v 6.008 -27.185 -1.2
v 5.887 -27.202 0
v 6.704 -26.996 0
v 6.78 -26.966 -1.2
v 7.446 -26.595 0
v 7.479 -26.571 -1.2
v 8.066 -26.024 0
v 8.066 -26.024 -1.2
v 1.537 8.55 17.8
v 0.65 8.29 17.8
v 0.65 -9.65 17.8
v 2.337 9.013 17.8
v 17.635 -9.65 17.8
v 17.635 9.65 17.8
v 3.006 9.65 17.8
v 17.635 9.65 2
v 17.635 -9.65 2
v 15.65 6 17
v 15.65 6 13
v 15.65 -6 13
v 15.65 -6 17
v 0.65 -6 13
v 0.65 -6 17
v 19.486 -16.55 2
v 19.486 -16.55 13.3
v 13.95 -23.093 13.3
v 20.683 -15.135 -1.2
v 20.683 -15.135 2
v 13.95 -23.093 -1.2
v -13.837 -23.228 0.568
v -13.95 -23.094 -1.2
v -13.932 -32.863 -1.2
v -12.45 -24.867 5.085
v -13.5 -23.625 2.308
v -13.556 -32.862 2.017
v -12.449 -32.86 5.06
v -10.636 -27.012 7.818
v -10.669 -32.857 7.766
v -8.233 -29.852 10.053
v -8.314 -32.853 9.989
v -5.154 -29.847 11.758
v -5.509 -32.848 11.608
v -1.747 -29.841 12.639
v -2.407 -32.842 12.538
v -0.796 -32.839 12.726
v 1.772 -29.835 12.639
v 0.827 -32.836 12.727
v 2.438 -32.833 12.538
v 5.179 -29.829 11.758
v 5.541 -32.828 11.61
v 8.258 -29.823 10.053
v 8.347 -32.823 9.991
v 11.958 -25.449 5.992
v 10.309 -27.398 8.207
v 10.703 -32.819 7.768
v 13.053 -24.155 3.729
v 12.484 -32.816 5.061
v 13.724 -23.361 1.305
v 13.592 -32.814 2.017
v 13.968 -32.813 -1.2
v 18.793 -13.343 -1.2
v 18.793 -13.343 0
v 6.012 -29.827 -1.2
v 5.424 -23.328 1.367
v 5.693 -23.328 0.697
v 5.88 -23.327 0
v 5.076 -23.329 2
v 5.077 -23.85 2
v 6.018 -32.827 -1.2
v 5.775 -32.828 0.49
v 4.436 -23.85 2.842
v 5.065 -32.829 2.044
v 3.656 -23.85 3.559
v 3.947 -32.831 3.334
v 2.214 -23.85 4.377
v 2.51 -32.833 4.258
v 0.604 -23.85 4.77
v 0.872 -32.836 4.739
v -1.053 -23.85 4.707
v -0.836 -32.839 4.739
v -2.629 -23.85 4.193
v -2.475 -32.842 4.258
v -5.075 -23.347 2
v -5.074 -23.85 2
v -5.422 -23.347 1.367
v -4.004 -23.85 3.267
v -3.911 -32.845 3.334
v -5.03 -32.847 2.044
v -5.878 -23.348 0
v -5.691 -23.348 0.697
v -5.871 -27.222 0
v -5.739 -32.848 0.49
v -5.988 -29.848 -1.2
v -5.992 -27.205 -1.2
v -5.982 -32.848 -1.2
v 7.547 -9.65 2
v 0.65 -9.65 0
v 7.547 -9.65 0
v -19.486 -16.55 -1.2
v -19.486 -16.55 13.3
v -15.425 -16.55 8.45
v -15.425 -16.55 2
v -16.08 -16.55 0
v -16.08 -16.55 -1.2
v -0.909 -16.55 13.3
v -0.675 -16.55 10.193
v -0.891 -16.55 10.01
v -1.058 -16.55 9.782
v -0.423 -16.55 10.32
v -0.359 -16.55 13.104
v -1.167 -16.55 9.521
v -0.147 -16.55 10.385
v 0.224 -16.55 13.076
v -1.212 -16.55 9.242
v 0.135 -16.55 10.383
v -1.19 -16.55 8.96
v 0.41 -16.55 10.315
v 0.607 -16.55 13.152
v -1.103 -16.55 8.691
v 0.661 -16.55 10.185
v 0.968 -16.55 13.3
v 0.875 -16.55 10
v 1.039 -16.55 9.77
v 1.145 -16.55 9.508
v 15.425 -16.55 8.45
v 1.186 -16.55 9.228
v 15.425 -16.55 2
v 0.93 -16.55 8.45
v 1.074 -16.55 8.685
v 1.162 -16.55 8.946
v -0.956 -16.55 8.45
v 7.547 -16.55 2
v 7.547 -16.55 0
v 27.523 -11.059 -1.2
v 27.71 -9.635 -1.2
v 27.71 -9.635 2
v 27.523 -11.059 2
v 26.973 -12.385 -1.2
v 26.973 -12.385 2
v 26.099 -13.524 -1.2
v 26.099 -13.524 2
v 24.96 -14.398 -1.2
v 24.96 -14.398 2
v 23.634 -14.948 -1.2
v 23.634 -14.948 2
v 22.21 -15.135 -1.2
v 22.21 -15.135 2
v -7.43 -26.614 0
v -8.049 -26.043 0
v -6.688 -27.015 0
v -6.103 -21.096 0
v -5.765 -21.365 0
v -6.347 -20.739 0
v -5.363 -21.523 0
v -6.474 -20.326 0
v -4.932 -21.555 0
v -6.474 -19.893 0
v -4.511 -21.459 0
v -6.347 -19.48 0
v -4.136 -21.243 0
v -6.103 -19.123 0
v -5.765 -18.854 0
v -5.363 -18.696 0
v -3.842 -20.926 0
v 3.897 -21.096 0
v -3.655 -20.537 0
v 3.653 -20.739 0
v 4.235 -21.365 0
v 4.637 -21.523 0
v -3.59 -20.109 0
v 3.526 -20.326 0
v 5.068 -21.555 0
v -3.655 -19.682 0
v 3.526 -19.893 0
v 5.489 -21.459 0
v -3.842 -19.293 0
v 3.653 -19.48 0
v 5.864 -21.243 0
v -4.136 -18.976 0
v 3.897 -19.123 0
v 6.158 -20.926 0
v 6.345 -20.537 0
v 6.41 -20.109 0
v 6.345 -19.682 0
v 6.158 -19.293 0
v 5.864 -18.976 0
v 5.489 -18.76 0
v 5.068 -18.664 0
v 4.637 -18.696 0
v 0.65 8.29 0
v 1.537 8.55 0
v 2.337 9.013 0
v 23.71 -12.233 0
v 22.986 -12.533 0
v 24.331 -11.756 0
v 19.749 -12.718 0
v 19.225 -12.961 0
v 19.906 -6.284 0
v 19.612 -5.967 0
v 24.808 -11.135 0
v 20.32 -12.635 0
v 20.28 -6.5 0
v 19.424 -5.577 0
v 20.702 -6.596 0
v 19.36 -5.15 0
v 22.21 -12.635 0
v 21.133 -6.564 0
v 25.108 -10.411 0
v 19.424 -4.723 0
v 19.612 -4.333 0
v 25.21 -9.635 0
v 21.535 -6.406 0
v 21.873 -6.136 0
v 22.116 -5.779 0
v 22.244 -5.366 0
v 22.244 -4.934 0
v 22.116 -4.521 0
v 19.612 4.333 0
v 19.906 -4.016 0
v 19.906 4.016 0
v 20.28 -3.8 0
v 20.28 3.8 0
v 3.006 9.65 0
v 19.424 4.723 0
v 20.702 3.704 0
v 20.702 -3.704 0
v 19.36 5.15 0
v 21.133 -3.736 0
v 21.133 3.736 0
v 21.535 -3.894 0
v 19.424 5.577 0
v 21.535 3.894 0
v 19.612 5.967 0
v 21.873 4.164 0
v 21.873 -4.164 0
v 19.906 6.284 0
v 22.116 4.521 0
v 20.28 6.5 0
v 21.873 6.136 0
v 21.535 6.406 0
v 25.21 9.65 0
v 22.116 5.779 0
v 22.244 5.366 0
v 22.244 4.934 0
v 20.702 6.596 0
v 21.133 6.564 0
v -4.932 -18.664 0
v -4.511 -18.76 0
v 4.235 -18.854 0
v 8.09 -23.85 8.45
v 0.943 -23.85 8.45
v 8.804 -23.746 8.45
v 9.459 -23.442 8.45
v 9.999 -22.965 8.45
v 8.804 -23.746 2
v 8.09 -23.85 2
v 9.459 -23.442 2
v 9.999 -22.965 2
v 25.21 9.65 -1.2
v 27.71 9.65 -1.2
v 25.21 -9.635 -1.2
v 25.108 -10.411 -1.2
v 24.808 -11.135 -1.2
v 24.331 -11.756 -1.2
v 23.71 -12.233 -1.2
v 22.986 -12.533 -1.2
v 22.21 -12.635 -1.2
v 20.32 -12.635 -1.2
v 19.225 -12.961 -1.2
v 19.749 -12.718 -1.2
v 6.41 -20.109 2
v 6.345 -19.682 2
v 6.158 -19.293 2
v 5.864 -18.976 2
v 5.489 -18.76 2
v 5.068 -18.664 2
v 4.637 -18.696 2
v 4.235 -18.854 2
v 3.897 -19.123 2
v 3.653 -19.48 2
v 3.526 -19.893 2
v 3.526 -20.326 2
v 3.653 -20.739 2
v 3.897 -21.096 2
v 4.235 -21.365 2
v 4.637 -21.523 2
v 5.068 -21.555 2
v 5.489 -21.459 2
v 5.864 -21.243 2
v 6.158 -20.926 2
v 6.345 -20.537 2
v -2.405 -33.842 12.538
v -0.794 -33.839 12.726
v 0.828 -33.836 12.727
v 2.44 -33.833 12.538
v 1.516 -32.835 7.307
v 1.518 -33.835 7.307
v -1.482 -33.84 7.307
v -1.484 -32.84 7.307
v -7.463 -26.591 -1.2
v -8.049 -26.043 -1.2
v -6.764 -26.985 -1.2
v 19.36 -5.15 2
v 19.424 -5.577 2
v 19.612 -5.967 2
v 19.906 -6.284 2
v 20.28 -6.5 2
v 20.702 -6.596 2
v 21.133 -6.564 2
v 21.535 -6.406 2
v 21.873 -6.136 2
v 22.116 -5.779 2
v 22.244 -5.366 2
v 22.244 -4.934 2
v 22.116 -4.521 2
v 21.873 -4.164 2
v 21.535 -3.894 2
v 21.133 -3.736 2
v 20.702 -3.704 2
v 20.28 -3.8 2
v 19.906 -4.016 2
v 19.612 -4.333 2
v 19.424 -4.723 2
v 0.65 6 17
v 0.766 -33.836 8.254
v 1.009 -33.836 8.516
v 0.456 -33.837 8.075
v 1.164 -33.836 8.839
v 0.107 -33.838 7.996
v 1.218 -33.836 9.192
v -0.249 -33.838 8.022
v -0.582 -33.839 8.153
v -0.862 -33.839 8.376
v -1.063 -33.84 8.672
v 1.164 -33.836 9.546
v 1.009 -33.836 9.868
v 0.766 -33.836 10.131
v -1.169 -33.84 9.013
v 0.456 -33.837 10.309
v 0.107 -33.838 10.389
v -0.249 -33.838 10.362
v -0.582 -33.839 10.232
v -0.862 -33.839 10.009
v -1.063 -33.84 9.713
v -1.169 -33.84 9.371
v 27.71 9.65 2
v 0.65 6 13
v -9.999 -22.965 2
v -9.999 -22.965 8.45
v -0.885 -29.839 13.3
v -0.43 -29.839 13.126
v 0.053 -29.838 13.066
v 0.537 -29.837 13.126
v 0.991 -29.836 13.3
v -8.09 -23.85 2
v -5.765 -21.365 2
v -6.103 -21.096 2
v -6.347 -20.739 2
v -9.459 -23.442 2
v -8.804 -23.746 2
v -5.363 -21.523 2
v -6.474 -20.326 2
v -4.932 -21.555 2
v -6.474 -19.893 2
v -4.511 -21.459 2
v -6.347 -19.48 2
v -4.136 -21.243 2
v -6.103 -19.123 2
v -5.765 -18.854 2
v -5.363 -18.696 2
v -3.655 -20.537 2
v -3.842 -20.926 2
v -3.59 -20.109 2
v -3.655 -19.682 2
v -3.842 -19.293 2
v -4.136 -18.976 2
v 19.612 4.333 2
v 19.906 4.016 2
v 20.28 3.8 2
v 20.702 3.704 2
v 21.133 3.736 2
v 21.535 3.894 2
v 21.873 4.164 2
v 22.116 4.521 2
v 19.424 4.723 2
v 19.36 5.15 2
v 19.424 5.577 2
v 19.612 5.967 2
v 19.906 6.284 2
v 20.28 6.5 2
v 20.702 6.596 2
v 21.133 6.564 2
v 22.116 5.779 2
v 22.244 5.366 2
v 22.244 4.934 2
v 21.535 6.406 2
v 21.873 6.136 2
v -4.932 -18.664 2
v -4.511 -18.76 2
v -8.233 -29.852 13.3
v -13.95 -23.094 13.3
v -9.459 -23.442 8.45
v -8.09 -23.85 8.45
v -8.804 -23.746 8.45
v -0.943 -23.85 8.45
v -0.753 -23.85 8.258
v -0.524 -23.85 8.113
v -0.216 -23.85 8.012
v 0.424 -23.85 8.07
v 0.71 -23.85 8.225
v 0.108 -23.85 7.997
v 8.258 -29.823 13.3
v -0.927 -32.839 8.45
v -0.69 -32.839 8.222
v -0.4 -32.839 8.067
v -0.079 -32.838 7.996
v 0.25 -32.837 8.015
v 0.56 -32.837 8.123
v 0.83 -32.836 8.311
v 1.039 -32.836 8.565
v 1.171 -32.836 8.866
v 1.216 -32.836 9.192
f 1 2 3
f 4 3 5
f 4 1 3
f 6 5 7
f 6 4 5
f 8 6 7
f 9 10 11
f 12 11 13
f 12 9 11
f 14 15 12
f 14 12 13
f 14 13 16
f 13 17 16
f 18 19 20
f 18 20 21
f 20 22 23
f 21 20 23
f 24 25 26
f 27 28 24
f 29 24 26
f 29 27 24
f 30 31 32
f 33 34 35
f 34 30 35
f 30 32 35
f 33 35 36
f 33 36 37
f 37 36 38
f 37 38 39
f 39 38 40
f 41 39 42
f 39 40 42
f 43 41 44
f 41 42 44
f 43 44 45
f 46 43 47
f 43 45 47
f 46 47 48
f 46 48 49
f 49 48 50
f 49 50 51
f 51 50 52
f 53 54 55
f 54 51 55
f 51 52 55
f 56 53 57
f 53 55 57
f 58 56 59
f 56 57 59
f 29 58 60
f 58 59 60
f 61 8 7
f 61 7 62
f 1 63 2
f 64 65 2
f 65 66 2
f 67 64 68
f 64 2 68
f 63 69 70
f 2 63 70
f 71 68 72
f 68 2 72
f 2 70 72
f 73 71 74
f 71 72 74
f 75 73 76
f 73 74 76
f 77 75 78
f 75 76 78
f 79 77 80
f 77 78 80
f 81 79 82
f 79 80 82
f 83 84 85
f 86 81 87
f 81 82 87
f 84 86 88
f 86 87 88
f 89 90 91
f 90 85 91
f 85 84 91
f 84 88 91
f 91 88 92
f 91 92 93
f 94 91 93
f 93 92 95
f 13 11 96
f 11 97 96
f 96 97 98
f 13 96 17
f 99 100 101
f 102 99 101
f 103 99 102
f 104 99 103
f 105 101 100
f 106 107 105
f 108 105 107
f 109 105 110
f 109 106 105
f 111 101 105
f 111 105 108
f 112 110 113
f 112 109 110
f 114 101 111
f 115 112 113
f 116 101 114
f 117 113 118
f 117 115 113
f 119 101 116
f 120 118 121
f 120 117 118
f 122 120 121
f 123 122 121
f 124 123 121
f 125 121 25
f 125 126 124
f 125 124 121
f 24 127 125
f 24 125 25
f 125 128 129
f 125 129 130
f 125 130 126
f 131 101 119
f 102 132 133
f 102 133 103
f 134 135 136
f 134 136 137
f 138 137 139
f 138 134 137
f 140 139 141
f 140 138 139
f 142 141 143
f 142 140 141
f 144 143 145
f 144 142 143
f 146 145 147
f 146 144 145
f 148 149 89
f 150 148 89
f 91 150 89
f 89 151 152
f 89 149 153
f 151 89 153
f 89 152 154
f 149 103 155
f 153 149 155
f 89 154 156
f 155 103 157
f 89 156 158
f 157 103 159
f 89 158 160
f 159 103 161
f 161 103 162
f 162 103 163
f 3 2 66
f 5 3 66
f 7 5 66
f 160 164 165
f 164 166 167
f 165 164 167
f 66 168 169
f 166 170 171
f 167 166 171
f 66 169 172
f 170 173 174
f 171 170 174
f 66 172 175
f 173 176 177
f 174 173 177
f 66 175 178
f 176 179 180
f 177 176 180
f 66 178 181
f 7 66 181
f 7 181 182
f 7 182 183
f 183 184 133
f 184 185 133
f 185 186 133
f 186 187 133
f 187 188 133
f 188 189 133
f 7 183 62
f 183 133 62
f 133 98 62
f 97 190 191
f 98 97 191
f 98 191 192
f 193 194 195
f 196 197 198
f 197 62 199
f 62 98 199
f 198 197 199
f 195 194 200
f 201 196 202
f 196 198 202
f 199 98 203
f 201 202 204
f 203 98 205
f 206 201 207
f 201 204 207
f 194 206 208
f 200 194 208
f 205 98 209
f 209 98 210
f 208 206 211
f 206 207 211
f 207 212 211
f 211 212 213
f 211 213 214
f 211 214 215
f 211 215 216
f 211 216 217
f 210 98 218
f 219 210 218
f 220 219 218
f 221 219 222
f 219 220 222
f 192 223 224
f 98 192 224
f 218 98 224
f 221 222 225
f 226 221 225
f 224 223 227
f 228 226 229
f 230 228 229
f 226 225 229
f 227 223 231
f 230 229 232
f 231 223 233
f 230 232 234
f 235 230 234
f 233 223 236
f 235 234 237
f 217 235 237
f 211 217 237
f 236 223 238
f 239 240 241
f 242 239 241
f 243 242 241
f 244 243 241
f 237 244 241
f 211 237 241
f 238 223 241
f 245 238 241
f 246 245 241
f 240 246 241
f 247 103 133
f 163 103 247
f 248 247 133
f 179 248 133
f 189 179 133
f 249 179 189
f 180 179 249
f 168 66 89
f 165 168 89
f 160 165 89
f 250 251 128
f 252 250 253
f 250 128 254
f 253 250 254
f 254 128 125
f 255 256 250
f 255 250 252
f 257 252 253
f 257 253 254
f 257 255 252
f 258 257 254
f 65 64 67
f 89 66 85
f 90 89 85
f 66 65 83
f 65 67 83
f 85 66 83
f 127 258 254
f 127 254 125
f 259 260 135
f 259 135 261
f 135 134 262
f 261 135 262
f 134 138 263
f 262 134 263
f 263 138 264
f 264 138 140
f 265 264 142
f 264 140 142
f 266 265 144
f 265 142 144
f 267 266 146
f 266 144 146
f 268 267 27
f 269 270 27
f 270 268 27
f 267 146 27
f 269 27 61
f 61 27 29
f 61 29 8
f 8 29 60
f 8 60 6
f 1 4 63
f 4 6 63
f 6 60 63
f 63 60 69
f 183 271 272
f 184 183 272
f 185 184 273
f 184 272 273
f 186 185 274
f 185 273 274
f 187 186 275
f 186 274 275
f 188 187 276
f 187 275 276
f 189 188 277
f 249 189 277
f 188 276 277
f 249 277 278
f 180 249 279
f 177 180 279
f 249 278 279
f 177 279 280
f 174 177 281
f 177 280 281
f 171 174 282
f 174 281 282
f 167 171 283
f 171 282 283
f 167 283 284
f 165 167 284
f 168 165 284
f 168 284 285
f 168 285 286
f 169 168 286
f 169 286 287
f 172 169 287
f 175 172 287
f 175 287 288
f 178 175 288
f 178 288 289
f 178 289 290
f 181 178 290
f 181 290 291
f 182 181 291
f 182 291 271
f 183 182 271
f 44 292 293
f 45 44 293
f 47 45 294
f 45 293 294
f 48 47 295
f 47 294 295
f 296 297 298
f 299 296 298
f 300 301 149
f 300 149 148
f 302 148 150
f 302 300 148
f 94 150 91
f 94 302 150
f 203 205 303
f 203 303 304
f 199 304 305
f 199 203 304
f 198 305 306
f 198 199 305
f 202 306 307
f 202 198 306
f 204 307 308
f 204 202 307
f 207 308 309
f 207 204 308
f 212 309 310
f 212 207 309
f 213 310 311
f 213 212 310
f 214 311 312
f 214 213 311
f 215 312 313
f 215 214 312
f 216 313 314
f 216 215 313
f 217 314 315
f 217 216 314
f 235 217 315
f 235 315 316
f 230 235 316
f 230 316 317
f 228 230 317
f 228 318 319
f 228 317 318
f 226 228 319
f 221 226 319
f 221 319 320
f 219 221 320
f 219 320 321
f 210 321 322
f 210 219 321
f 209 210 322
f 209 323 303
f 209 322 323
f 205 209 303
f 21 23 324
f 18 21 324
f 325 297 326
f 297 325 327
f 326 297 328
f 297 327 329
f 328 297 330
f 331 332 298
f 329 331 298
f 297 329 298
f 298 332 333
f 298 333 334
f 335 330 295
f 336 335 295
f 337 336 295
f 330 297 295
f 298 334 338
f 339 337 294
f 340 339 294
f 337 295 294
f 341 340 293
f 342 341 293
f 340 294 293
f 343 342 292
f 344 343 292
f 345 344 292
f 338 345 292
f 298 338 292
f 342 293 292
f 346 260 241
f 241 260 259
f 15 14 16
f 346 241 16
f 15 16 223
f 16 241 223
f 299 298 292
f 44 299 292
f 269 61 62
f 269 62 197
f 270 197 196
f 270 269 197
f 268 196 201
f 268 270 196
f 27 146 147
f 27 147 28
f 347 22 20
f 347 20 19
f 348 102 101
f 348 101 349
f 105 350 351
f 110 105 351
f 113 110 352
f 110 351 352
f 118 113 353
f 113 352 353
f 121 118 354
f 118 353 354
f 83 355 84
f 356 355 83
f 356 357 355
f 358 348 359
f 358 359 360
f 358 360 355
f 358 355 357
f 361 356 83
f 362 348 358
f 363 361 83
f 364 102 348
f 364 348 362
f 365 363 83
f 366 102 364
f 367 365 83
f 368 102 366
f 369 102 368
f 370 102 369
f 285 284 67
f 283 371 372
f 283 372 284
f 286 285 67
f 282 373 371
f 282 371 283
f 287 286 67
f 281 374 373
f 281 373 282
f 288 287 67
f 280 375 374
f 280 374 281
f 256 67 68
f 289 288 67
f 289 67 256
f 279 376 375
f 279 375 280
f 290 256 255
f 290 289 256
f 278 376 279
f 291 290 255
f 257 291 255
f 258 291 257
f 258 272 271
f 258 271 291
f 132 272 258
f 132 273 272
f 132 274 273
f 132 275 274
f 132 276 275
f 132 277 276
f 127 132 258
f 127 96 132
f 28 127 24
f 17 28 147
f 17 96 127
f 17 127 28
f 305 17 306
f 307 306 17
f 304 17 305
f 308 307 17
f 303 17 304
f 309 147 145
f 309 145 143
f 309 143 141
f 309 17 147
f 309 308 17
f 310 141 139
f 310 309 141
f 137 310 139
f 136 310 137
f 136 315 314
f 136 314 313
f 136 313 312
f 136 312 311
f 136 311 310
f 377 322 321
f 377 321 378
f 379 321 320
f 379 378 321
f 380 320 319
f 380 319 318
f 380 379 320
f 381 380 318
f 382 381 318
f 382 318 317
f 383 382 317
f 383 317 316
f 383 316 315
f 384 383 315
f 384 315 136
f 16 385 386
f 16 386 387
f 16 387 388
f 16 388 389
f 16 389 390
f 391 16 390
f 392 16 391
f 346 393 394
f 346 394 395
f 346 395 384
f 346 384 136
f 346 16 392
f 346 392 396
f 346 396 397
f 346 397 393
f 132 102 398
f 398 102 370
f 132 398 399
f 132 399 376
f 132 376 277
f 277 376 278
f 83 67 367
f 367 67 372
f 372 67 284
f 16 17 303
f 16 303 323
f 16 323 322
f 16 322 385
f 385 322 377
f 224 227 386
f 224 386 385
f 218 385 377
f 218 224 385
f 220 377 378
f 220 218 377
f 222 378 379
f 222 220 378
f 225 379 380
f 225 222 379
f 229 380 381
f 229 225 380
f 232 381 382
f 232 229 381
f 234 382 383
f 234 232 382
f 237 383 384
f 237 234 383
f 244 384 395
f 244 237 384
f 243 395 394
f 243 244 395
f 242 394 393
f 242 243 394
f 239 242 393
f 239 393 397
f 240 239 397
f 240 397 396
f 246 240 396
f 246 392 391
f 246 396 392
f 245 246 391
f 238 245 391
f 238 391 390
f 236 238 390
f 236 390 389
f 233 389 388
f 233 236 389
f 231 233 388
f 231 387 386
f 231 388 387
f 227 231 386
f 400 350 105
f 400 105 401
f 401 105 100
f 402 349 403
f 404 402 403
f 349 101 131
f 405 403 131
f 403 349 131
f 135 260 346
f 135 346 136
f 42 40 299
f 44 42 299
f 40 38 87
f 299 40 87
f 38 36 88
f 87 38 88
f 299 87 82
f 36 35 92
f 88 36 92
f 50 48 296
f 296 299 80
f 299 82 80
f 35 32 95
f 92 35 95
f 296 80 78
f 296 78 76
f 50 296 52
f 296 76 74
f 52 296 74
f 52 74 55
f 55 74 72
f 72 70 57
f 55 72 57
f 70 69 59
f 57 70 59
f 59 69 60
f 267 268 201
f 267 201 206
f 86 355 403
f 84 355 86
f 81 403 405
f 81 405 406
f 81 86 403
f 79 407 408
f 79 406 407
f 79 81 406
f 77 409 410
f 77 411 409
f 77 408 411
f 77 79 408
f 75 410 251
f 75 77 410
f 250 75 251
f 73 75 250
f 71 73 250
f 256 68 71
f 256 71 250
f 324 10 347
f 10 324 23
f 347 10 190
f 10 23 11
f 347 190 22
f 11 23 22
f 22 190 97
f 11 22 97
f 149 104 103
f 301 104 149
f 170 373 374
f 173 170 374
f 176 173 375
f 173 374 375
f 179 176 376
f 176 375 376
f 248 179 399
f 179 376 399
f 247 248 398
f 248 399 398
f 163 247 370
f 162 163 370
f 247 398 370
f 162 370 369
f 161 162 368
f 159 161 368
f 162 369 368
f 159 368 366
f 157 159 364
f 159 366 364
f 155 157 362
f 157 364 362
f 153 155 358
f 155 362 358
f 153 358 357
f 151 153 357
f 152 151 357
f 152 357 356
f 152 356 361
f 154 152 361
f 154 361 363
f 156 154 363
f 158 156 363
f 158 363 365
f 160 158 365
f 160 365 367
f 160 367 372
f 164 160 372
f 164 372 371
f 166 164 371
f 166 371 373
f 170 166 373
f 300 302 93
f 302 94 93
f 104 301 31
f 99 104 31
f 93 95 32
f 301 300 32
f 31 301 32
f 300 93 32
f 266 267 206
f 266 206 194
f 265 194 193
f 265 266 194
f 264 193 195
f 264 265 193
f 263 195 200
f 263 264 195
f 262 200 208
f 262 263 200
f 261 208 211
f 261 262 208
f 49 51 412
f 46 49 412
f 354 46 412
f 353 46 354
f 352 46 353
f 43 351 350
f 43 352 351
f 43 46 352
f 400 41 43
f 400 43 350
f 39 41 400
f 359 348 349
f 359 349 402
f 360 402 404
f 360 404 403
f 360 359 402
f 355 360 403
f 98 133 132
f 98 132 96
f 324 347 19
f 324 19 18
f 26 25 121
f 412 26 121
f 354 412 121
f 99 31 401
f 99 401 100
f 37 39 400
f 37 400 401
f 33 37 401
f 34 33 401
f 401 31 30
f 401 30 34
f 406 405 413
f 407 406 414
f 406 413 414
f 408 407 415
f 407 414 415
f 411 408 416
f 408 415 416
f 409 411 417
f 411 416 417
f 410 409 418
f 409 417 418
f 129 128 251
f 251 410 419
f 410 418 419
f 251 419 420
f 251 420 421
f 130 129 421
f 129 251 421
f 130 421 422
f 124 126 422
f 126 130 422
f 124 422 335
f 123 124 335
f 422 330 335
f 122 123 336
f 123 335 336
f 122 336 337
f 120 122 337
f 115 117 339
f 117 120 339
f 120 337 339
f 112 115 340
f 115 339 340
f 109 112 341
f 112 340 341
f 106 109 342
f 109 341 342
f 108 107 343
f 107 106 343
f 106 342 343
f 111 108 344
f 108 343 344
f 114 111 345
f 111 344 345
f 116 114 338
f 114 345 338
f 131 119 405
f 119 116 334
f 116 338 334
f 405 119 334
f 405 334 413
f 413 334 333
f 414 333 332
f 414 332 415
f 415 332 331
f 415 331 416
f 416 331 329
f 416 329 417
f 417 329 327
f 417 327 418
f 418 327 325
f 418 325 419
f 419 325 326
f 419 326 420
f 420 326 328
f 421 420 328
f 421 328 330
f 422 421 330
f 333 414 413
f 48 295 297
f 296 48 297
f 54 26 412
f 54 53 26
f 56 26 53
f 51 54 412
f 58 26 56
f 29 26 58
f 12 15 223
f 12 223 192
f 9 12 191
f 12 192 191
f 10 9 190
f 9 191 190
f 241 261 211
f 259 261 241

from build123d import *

# Parameters (mm, degrees)
EXTRUDE_1_DEPTH           = 14.5
EXTRUDE_2_REACH           = 54.409
CUT_EXTRUDE_2_DEPTH       = 6.5
CUT_EXTRUDE_4_DEPTH       = 1.2
CUT_EXTRUDE_5_DEPTH       = 6.45
CUT_EXTRUDE_6_REACH       = 46.446
SKETCH_12_R               = 1.45
CUT_EXTRUDE_START         = -11.3
CUT_EXTRUDE_9_DEPTH       = 11.3
CUT_EXTRUDE_10_DEPTH      = 10
CUT_EXTRUDE_10_DEPTH_BACK = 45.446455555
SKETCH_17_R               = 1.45
EXTRUDE_START             = 1
SKETCH_18_R               = 1.2
EXTRUDE_3_DEPTH           = 1
CUT_EXTRUDE_11_REACH      = 54.409
SKETCH_20_R               = 1.2
EXTRUDE_4_DEPTH           = 4.5
SKETCH_23_W               = 4
SKETCH_23_H               = 12
CUT_EXTRUDE_13_DEPTH      = 15
CUT_EXTRUDE_14_REACH      = 53.391
SKETCH_24_R               = 2


with BuildPart() as part:
    # 草圖2 → 填料-伸長1 (new body)
    with BuildSketch(Plane.XY.offset(-1.2)):
        with BuildLine():
            Line((3.005790246, 9.65), (27.71, 9.65))
            Line((27.71, 9.65), (27.71, -9.635))
            ThreePointArc((27.71, -9.635), (26.099087297, -13.524087297), (22.21, -15.135))
            Line((22.21, -15.135), (20.682621431, -15.135))
            Line((20.682621431, -15.135), (13.950432746, -23.093384504))
            Line((13.950432746, -23.093384504), (8.257610616, -29.823093007))
            Line((8.257610616, -29.823093007), (-8.232750503, -29.852481121))
            Line((-8.232750503, -29.852481121), (-13.949609825, -23.094357311))
            Line((-13.949609825, -23.094357311), (-19.48563893, -16.55))
            Line((-19.48563893, -16.55), (3.005790246, -16.55))
            Line((3.005790246, -16.55), (7.547371488, -16.55))
            Line((7.547371488, -16.55), (7.547371488, -9.65))
            Line((7.547371488, -9.65), (0.65, -9.65))
            Line((0.65, -9.65), (0.65, 8.289548141))
            ThreePointArc((0.65, 8.289548141), (1.950360965, 8.757709354), (3.005790246, 9.65))
        make_face()
    extrude(amount=EXTRUDE_1_DEPTH)

    # 草圖6 → 填料-伸長2 (add, up to next)
    with BuildSketch(Plane(origin=(0.058521361, -32.837709687, 0), x_dir=(-0.9999984119942069, -0.0017821360960036876, 0), z_dir=(0.0017821360960036876, -0.9999984119942069, 0)), mode=Mode.PRIVATE) as extrude_2_sk1:
        with BuildLine():
            Line((6.040744961, 1.2), (13.990744961, 1.2))
            ThreePointArc((13.990744961, 1.2), (0.040744961, -12.75), (-13.909255039, 1.2))
            Line((-13.909255039, 1.2), (-5.959255039, 1.2))
            ThreePointArc((-5.959255039, 1.2), (0.040744961, -4.8), (6.040744961, 1.2))
        make_face()
    extrude_2_tool1 = extrude(extrude_2_sk1.sketch, amount=-EXTRUDE_2_REACH, mode=Mode.PRIVATE) - part.part
    add(extrude_2_tool1.solids().sort_by_distance((0.017776, -32.837782, 5.486422))[0])

    # 草圖8 → 除料-伸長2 (cut)
    with BuildSketch(Plane(origin=(0.053174952, -29.837714451, 0), x_dir=(0.9999984119942069, 0.0017821360960043932, 0), z_dir=(0.0017821360960043932, -0.9999984119942069, 0))):
        with BuildLine():
            Line((5.959255039, -1.2), (-6.040744961, -1.2))
            ThreePointArc((-6.040744961, -1.2), (-0.040744961, 4.8), (5.959255039, -1.2))
        make_face()
    extrude(amount=-CUT_EXTRUDE_2_DEPTH, mode=Mode.SUBTRACT)

    # 草圖10 → 除料-伸長4 (cut)
    with BuildSketch(Plane(origin=(0, 0, -1.2), x_dir=(-1, 0, 0), z_dir=(0, 0, -1))):
        with BuildLine():
            Line((15.425245412, -16.55), (16.080147592, -16.55))
            Line((16.080147592, -16.55), (8.049473708, -26.043374829))
            ThreePointArc((8.049473708, -26.043374829), (6.88166706, -26.933100433), (5.447606932, -27.24751348))
            Line((5.447606932, -27.24751348), (-5.476193678, -27.228045749))
            ThreePointArc((-5.476193678, -27.228045749), (-6.90363194, -26.911082911), (-8.065941929, -26.023907099))
            Line((-8.065941929, -26.023907099), (-18.792755233, -13.343320029))
            ThreePointArc((-18.792755233, -13.343320029), (-19.478083321, -12.820701245), (-20.319700829, -12.635))
            Line((-20.319700829, -12.635), (-22.21, -12.635))
            ThreePointArc((-22.21, -12.635), (-24.331320344, -11.756320344), (-25.21, -9.635))
            Line((-25.21, -9.635), (-25.21, 9.756016868))
            Line((-25.21, 9.756016868), (-3.090378498, 9.756016868))
            ThreePointArc((-3.090378498, 9.756016868), (-2.008790795, 8.792133036), (-0.65, 8.289548141))
            Line((-0.65, 8.289548141), (-0.65, -9.65))
            Line((-0.65, -9.65), (-7.547371488, -9.65))
            Line((-7.547371488, -9.65), (-7.547371488, -16.55))
            Line((-7.547371488, -16.55), (15.425245412, -16.55))
        make_face()
    extrude(amount=-CUT_EXTRUDE_4_DEPTH, mode=Mode.SUBTRACT)

    # 草圖11 → 除料-伸長5 (cut)
    with BuildSketch(Plane(origin=(0, 0, 2), x_dir=(-1, 0, 0), z_dir=(0, 0, -1))):
        with BuildLine():
            Line((15.425245412, -16.55), (9.998981166, -22.964599963))
            ThreePointArc((9.998981166, -22.964599963), (9.142321056, -23.617873443), (8.090299171, -23.85))
            Line((8.090299171, -23.85), (-8.090299171, -23.85))
            ThreePointArc((-8.090299171, -23.85), (-9.142321056, -23.617873443), (-9.998981166, -22.964599963))
            Line((-9.998981166, -22.964599963), (-15.425245412, -16.55))
            Line((-15.425245412, -16.55), (15.425245412, -16.55))
        make_face()
    extrude(amount=-CUT_EXTRUDE_5_DEPTH, mode=Mode.SUBTRACT)

    # 草圖12 → 除料-伸長6 (cut, up to next)
    with BuildSketch(Plane.XY.offset(2), mode=Mode.PRIVATE) as cut_extrude_6_sk1:
        with Locations((-5.040260671, -20.109460334)):
            Circle(SKETCH_12_R)
    cut_extrude_6_tool1 = extrude(cut_extrude_6_sk1.sketch, amount=-CUT_EXTRUDE_6_REACH, mode=Mode.PRIVATE) & part.part
    # 草圖12 → 除料-伸長6 (cut, up to next)
    with BuildSketch(Plane.XY.offset(2), mode=Mode.PRIVATE) as cut_extrude_6_sk2:
        with Locations((4.959739329, -20.109460334)):
            Circle(SKETCH_12_R)
    cut_extrude_6_tool2 = extrude(cut_extrude_6_sk2.sketch, amount=-CUT_EXTRUDE_6_REACH, mode=Mode.PRIVATE) & part.part
    add(cut_extrude_6_tool1.solids().sort_by_distance((-5.040261, -20.10946, 2))[0], mode=Mode.SUBTRACT)
    add(cut_extrude_6_tool2.solids().sort_by_distance((4.959739, -20.10946, 2))[0], mode=Mode.SUBTRACT)

    # 草圖16 → 除料-伸長9 (cut)
    with BuildSketch(Plane.XY.offset(13.3).offset(CUT_EXTRUDE_START)):
        with BuildLine():
            Line((27.71, 9.65), (17.635, 9.65))
            Line((17.635, 9.65), (17.635, -9.65))
            Line((17.635, -9.65), (7.547371488, -9.65))
            Line((7.547371488, -9.65), (7.547371488, -16.55))
            Line((7.547371488, -16.55), (19.48563893, -16.55))
            Line((19.48563893, -16.55), (20.682621431, -15.135))
            Line((20.682621431, -15.135), (22.21, -15.135))
            ThreePointArc((22.21, -15.135), (26.099087297, -13.524087297), (27.71, -9.635))
            Line((27.71, -9.635), (27.71, 9.65))
        make_face()
    extrude(amount=CUT_EXTRUDE_9_DEPTH, mode=Mode.SUBTRACT)

    # 草圖17 → 除料-伸長10 (cut, two sides: drawn at the far end of the back side and taken through both)
    with BuildSketch(Plane.XY.offset(2).offset(-CUT_EXTRUDE_10_DEPTH_BACK)):
        with Locations(Location((20.81, 5.15, 0), (0, 0, 180))):
            Circle(SKETCH_17_R)
        with Locations(Location((20.81, -5.15, 0), (0, 0, 180))):
            Circle(SKETCH_17_R)
    extrude(amount=CUT_EXTRUDE_10_DEPTH + CUT_EXTRUDE_10_DEPTH_BACK, mode=Mode.SUBTRACT)

    # 草圖18 → 填料-伸長3 (add)
    with BuildSketch(Plane(origin=(0.058521361, -32.837709687, 0), x_dir=(0.9999984119942069, 0.001782136096003688, 0), z_dir=(0.001782136096003688, -0.9999984119942069, 0)).offset(EXTRUDE_START)):
        with BuildLine():
            Line((-1.542184808, 7.30666872), (-2.465462288, 12.537657948))
            ThreePointArc((-2.465462288, 12.537657948), (-0.043106116, 12.7499998), (2.379321799, 12.538477968))
            Line((2.379321799, 12.538477968), (1.457815149, 7.307176495))
            Line((1.457815149, 7.307176495), (-1.542184808, 7.30666872))
        make_face()
        with Locations((-0.042503946, 9.192304697)):
            Circle(SKETCH_18_R, mode=Mode.SUBTRACT)
    extrude(amount=-EXTRUDE_3_DEPTH)

    # 草圖20 → 除料-伸長11 (cut, up to next)
    with BuildSketch(Plane(origin=(0.058521361, -32.837709687, 0), x_dir=(0.9999984119942069, 0.001782136096003688, 0), z_dir=(0.001782136096003688, -0.9999984119942069, 0)), mode=Mode.PRIVATE) as cut_extrude_11_sk1:
        with Locations(Location((-0.042503946, 9.192304697, 0), (0, 0, 218.213041012))):
            Circle(SKETCH_20_R)
    cut_extrude_11_tool1 = extrude(cut_extrude_11_sk1.sketch, amount=-CUT_EXTRUDE_11_REACH, mode=Mode.PRIVATE) & part.part
    add(cut_extrude_11_tool1.solids().sort_by_distance((0.016017, -32.837785, 9.192305))[0], mode=Mode.SUBTRACT)

    # 草圖22 → 填料-伸長4 (add)
    with BuildSketch(Plane.XY.offset(13.3)):
        with BuildLine():
            Line((0.65, 8.289548141), (0.65, -9.65))
            Line((0.65, -9.65), (17.635, -9.65))
            Line((17.635, -9.65), (17.635, 9.65))
            Line((17.635, 9.65), (3.005790246, 9.65))
            ThreePointArc((3.005790246, 9.65), (1.950360965, 8.757709354), (0.65, 8.289548141))
        make_face()
    extrude(amount=EXTRUDE_4_DEPTH)

    # 草圖23 → 除料-伸長13 (cut)
    with BuildSketch(Plane.ZY.offset(-0.65)):
        with Locations((15, 0)):
            Rectangle(SKETCH_23_W, SKETCH_23_H)
    extrude(amount=-CUT_EXTRUDE_13_DEPTH, mode=Mode.SUBTRACT)

    # 除料-伸長14: up to this plane
    cut_extrude_14_end = Plane(origin=(3.005790246, -16.55, 13.3), z_dir=(0, -1, 0))
    # 草圖24 → 除料-伸長14 (cut, up to the surface)
    with BuildSketch(Plane(origin=(0.053174952, -29.837714451, 0), x_dir=(0.9999984119942069, 0.0017821360960043932, 0), z_dir=(0.0017821360960043932, -0.9999984119942069, 0)), mode=Mode.PRIVATE) as cut_extrude_14_sk1:
        with Locations((0, 15.066296733)):
            Circle(SKETCH_24_R)
    cut_extrude_14_tool1 = split(extrude(cut_extrude_14_sk1.sketch, amount=-CUT_EXTRUDE_14_REACH, mode=Mode.PRIVATE), bisect_by=cut_extrude_14_end, keep=Keep.BOTH, mode=Mode.PRIVATE)
    add(cut_extrude_14_tool1.solids().sort_by_distance((0.053175, -29.837714, 15.066297))[0], mode=Mode.SUBTRACT)


solid = part.part
